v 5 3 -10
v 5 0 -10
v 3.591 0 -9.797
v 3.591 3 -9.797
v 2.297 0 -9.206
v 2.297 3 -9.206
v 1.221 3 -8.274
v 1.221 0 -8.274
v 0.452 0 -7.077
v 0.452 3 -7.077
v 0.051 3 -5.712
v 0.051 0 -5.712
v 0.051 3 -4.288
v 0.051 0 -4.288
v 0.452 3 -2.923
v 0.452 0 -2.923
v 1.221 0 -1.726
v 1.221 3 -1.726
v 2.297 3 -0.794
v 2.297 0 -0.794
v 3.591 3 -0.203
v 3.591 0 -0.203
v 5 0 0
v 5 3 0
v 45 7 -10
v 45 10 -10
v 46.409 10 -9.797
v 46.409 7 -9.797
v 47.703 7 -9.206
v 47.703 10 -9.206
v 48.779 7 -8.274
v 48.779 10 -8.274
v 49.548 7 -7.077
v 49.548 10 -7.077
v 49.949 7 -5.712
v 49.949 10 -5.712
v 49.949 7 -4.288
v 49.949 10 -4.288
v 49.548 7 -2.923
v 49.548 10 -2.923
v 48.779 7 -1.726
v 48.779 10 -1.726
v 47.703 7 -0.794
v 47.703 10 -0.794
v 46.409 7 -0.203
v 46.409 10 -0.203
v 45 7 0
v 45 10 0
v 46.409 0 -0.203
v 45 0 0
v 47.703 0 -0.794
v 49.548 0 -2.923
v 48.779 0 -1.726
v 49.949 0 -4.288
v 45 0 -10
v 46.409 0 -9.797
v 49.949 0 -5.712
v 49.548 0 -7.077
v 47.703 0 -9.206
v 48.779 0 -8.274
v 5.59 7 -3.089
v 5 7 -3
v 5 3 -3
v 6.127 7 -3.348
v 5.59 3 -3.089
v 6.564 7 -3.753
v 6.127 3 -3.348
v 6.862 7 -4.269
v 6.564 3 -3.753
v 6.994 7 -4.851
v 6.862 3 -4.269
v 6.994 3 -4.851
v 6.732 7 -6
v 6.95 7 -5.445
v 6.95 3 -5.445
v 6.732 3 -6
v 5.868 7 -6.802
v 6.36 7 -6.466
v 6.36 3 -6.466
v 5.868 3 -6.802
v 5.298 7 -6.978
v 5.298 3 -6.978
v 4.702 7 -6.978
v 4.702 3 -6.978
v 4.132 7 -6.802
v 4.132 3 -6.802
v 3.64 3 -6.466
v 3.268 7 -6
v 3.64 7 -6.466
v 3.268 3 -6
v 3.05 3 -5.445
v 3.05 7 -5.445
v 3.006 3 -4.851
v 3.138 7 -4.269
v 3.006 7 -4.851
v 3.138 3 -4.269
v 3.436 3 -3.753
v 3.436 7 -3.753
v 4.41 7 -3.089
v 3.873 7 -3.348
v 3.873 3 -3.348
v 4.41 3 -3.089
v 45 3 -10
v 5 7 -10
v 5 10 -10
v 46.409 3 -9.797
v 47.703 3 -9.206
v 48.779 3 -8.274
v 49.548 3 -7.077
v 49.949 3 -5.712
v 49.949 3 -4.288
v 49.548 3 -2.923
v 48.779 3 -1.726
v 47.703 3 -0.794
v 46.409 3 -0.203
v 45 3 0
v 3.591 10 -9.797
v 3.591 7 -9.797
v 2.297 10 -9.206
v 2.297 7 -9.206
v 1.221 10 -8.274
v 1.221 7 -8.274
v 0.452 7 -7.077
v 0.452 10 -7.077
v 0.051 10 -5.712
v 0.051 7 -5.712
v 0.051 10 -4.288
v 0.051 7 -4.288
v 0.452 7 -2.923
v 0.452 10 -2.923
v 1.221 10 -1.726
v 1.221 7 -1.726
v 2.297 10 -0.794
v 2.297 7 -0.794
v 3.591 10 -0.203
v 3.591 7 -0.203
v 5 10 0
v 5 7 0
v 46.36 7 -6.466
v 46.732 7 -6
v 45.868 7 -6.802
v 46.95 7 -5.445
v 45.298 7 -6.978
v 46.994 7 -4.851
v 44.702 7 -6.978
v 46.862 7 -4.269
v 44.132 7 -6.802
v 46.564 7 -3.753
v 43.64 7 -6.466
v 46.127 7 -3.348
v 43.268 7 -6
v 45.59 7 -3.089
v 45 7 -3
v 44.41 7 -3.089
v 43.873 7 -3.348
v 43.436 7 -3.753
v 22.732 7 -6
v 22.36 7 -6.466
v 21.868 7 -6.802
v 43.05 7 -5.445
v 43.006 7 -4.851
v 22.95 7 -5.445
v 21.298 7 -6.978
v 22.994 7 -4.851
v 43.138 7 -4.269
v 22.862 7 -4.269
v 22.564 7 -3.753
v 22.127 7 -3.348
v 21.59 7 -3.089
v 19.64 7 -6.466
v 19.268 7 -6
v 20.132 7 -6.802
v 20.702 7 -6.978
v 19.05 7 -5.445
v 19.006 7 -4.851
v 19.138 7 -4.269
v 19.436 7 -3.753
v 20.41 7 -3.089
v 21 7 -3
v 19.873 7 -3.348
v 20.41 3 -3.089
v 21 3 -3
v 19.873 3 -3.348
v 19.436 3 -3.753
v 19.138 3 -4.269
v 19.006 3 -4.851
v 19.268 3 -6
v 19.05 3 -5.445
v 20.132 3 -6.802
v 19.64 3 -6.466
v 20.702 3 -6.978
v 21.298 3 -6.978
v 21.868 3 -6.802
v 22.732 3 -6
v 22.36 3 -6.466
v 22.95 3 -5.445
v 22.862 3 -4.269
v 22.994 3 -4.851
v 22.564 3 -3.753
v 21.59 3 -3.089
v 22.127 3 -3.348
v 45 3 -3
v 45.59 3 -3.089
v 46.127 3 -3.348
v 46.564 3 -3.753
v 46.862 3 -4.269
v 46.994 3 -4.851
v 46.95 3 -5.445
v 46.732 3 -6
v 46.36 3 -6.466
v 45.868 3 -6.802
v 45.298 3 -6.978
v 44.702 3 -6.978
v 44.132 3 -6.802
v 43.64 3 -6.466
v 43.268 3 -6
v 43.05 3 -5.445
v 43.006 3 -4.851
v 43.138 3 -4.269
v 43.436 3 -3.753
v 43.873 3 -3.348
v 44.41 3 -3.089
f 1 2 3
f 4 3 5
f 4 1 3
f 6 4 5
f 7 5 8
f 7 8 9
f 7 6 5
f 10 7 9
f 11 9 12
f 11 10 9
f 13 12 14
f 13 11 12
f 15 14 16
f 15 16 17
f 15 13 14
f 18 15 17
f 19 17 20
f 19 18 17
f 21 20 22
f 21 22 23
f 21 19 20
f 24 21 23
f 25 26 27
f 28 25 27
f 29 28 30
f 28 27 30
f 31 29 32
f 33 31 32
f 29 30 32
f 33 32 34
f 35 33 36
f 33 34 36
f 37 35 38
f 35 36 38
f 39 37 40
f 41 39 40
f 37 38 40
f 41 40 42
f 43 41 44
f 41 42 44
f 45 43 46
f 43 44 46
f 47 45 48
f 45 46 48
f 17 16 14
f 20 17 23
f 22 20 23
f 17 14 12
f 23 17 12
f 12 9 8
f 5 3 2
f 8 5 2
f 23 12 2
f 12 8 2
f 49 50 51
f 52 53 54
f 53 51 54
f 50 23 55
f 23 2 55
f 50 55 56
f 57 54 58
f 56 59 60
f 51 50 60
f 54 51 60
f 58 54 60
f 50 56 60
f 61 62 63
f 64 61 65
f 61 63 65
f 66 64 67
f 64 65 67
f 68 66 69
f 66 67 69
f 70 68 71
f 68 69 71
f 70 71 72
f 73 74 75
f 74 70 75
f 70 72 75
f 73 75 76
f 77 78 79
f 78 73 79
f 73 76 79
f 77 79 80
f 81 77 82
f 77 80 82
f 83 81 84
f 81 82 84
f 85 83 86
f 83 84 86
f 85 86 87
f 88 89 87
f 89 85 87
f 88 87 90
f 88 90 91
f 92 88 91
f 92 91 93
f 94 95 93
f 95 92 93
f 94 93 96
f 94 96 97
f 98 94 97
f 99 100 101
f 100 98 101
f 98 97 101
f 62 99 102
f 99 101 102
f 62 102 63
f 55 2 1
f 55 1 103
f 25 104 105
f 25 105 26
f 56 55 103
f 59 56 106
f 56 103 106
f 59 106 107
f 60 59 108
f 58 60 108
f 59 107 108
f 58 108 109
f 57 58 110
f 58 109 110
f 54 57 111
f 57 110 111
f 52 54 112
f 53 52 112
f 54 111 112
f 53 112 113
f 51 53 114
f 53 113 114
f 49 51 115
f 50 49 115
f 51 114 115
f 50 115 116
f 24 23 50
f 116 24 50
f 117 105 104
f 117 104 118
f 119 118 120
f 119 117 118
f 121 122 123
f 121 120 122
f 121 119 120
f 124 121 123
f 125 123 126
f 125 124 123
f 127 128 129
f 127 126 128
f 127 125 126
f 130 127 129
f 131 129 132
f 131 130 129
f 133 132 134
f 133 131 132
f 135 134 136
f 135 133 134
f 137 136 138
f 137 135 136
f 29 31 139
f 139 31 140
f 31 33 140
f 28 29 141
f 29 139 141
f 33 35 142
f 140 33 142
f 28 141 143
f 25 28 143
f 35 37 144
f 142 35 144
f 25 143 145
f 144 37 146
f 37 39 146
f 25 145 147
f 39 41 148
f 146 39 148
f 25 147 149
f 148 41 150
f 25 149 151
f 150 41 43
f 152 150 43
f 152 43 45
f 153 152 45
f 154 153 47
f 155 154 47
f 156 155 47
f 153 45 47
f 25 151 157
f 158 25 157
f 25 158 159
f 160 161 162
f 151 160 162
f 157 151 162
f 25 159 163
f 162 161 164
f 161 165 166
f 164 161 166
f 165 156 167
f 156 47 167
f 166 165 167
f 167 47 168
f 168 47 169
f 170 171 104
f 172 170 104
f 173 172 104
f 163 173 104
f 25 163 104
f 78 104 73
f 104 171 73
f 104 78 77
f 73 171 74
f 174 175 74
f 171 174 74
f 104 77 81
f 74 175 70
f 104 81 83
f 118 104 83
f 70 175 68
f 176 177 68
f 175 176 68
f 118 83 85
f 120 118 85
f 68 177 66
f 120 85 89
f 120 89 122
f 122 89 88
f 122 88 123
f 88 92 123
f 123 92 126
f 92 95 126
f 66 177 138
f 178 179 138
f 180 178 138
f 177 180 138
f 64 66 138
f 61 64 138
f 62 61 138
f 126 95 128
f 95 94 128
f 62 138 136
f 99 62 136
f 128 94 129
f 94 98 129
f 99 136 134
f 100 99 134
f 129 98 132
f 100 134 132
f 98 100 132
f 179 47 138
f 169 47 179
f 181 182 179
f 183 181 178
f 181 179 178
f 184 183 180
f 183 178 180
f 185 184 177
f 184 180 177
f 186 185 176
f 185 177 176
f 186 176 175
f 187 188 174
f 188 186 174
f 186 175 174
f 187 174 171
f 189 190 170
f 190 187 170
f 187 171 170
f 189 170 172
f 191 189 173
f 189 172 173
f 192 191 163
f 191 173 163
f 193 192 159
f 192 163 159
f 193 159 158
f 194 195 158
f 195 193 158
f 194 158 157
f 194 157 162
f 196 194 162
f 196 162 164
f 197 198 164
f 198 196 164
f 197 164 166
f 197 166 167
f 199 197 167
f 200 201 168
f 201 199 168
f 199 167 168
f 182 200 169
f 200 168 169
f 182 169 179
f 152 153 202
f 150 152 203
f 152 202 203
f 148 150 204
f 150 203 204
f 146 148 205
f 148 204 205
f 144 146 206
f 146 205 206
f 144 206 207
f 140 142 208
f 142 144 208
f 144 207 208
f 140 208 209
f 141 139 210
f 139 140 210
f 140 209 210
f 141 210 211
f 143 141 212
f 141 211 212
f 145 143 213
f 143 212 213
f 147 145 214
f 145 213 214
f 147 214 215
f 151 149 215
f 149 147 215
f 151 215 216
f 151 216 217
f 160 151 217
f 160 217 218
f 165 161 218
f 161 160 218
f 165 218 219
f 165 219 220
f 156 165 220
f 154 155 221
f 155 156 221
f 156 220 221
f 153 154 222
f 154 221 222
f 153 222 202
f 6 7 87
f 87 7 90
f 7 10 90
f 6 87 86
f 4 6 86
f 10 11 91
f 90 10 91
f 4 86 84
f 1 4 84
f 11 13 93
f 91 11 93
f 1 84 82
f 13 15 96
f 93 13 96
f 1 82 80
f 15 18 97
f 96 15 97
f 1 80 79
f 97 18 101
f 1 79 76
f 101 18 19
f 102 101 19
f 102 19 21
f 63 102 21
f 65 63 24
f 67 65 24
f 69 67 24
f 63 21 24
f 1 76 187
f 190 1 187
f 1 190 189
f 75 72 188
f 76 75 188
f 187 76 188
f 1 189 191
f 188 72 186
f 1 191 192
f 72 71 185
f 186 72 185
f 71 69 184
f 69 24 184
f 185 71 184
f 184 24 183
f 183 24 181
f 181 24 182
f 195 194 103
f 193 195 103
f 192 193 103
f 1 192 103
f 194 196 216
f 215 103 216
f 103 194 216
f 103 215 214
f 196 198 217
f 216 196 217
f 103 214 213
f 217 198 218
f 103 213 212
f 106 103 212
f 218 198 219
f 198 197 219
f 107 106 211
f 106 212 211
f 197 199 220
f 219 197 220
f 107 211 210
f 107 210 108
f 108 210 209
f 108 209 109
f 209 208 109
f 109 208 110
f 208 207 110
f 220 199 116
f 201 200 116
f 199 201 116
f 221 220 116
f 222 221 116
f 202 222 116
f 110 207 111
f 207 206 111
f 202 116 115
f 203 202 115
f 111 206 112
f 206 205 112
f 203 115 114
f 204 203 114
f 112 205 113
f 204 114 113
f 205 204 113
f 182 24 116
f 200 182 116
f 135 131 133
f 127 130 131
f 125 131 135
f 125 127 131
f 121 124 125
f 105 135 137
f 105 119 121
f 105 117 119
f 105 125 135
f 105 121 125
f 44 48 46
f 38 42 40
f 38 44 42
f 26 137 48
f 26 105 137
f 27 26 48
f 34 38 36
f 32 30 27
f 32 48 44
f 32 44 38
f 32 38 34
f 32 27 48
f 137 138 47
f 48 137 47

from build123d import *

# Parameters (mm, degrees)
ESQUISSE1_W             = 50
ESQUISSE1_H             = 10
BOSS_EXTRU_1_DEPTH      = 10
ENL_V_MAT_EXTRU_1_DEPTH = 10
ESQUISSE3_R             = 2
BOSS_EXTRU_2_DEPTH      = 5
ENL_V_MAT_EXTRU_2_DEPTH = 52.961524227
ESQUISSE6_R             = 2
BOSS_EXTRU_3_DEPTH      = 5


with BuildPart() as part:
    # Esquisse1 → Boss.-Extru.1 (new body)
    with BuildSketch(Plane(origin=(0, 0, 0), x_dir=(1, 0, 0), z_dir=(0, 1, 0))):
        with Locations((25, 5)):
            Rectangle(ESQUISSE1_W, ESQUISSE1_H)
    extrude(amount=BOSS_EXTRU_1_DEPTH)

    # Esquisse2 → Enlèv. mat.-Extru.1 (cut)
    with BuildSketch(Plane.XY):
        Polygon((0, 3), (20, 3), (30, 3), (50, 3), (50, 7), (30, 7), (20, 7), (0, 7), align=None)
    extrude(amount=-ENL_V_MAT_EXTRU_1_DEPTH, mode=Mode.SUBTRACT)


with BuildPart() as enl_v_mat_extru_1_piece_1:
    # of the separate pieces the step leaves, piece 1, a body of its own (enl_v_mat_extru_1_pieces)
    add(part.part.solids().sort_by_distance((0, 7, 0))[0])

    # Esquisse3 → Boss.-Extru.2 (add)
    with BuildSketch(Plane(origin=(0, 3, 0), x_dir=(1, 0, 0), z_dir=(0, 1, 0))):
        with Locations(Location((5, 5, 0), (0, 0, 270))):
            Circle(ESQUISSE3_R)
        with Locations(Location((45, 5, 0), (0, 0, 270))):
            Circle(ESQUISSE3_R)
    extrude(amount=BOSS_EXTRU_2_DEPTH)


with BuildPart() as enl_v_mat_extru_1_piece_2:
    # of the separate pieces the step leaves, piece 2, a body of its own (enl_v_mat_extru_1_pieces)
    add(part.part.solids().sort_by_distance((0, 0, 0))[0])


with BuildPart() as enl_v_mat_extru_2_tool:
    # Esquisse4 → Enlèv. mat.-Extru.2 (new, through all)
    with BuildSketch(Plane(origin=(0, 10, 0), x_dir=(1, 0, 0), z_dir=(0, 1, 0))):
        with BuildLine():
            Line((5, 0), (-6.304307012, 0))
            Line((-6.304307012, 0), (-6.304307012, 10))
            Line((-6.304307012, 10), (5, 10))
            ThreePointArc((5, 10), (0, 5), (5, 0))
        make_face()
        with BuildLine():
            Line((45, 0), (61.280681511, 0))
            Line((61.280681511, 0), (61.280681511, 10))
            Line((61.280681511, 10), (45, 10))
            ThreePointArc((45, 10), (50, 5), (45, 0))
        make_face()
    extrude(amount=-ENL_V_MAT_EXTRU_2_DEPTH)


with BuildPart() as enl_v_mat_extru_1_piece_1_1:
    add(enl_v_mat_extru_1_piece_1.part)

    # Enlèv. mat.-Extru.2: cut by enl_v_mat_extru_2_tool
    add(enl_v_mat_extru_2_tool.part, mode=Mode.SUBTRACT)



with BuildPart() as enl_v_mat_extru_1_piece_2_1:
    add(enl_v_mat_extru_1_piece_2.part)

    # Enlèv. mat.-Extru.2: cut by enl_v_mat_extru_2_tool
    add(enl_v_mat_extru_2_tool.part, mode=Mode.SUBTRACT)


with BuildPart() as enl_v_mat_extru_1_piece_1_2:
    add(enl_v_mat_extru_1_piece_1_1.part)

    add(enl_v_mat_extru_1_piece_2_1.part)  # Boss.-Extru.3 merges Enlèv. mat.-Extru.1 piece 2
    # Esquisse6 → Boss.-Extru.3 (add)
    with BuildSketch(Plane.XZ.offset(-7)):
        with Locations(Location((21, -5, 0), (0, 0, 90))):
            Circle(ESQUISSE6_R)
    extrude(amount=BOSS_EXTRU_3_DEPTH)


solid = enl_v_mat_extru_1_piece_1_2.part
